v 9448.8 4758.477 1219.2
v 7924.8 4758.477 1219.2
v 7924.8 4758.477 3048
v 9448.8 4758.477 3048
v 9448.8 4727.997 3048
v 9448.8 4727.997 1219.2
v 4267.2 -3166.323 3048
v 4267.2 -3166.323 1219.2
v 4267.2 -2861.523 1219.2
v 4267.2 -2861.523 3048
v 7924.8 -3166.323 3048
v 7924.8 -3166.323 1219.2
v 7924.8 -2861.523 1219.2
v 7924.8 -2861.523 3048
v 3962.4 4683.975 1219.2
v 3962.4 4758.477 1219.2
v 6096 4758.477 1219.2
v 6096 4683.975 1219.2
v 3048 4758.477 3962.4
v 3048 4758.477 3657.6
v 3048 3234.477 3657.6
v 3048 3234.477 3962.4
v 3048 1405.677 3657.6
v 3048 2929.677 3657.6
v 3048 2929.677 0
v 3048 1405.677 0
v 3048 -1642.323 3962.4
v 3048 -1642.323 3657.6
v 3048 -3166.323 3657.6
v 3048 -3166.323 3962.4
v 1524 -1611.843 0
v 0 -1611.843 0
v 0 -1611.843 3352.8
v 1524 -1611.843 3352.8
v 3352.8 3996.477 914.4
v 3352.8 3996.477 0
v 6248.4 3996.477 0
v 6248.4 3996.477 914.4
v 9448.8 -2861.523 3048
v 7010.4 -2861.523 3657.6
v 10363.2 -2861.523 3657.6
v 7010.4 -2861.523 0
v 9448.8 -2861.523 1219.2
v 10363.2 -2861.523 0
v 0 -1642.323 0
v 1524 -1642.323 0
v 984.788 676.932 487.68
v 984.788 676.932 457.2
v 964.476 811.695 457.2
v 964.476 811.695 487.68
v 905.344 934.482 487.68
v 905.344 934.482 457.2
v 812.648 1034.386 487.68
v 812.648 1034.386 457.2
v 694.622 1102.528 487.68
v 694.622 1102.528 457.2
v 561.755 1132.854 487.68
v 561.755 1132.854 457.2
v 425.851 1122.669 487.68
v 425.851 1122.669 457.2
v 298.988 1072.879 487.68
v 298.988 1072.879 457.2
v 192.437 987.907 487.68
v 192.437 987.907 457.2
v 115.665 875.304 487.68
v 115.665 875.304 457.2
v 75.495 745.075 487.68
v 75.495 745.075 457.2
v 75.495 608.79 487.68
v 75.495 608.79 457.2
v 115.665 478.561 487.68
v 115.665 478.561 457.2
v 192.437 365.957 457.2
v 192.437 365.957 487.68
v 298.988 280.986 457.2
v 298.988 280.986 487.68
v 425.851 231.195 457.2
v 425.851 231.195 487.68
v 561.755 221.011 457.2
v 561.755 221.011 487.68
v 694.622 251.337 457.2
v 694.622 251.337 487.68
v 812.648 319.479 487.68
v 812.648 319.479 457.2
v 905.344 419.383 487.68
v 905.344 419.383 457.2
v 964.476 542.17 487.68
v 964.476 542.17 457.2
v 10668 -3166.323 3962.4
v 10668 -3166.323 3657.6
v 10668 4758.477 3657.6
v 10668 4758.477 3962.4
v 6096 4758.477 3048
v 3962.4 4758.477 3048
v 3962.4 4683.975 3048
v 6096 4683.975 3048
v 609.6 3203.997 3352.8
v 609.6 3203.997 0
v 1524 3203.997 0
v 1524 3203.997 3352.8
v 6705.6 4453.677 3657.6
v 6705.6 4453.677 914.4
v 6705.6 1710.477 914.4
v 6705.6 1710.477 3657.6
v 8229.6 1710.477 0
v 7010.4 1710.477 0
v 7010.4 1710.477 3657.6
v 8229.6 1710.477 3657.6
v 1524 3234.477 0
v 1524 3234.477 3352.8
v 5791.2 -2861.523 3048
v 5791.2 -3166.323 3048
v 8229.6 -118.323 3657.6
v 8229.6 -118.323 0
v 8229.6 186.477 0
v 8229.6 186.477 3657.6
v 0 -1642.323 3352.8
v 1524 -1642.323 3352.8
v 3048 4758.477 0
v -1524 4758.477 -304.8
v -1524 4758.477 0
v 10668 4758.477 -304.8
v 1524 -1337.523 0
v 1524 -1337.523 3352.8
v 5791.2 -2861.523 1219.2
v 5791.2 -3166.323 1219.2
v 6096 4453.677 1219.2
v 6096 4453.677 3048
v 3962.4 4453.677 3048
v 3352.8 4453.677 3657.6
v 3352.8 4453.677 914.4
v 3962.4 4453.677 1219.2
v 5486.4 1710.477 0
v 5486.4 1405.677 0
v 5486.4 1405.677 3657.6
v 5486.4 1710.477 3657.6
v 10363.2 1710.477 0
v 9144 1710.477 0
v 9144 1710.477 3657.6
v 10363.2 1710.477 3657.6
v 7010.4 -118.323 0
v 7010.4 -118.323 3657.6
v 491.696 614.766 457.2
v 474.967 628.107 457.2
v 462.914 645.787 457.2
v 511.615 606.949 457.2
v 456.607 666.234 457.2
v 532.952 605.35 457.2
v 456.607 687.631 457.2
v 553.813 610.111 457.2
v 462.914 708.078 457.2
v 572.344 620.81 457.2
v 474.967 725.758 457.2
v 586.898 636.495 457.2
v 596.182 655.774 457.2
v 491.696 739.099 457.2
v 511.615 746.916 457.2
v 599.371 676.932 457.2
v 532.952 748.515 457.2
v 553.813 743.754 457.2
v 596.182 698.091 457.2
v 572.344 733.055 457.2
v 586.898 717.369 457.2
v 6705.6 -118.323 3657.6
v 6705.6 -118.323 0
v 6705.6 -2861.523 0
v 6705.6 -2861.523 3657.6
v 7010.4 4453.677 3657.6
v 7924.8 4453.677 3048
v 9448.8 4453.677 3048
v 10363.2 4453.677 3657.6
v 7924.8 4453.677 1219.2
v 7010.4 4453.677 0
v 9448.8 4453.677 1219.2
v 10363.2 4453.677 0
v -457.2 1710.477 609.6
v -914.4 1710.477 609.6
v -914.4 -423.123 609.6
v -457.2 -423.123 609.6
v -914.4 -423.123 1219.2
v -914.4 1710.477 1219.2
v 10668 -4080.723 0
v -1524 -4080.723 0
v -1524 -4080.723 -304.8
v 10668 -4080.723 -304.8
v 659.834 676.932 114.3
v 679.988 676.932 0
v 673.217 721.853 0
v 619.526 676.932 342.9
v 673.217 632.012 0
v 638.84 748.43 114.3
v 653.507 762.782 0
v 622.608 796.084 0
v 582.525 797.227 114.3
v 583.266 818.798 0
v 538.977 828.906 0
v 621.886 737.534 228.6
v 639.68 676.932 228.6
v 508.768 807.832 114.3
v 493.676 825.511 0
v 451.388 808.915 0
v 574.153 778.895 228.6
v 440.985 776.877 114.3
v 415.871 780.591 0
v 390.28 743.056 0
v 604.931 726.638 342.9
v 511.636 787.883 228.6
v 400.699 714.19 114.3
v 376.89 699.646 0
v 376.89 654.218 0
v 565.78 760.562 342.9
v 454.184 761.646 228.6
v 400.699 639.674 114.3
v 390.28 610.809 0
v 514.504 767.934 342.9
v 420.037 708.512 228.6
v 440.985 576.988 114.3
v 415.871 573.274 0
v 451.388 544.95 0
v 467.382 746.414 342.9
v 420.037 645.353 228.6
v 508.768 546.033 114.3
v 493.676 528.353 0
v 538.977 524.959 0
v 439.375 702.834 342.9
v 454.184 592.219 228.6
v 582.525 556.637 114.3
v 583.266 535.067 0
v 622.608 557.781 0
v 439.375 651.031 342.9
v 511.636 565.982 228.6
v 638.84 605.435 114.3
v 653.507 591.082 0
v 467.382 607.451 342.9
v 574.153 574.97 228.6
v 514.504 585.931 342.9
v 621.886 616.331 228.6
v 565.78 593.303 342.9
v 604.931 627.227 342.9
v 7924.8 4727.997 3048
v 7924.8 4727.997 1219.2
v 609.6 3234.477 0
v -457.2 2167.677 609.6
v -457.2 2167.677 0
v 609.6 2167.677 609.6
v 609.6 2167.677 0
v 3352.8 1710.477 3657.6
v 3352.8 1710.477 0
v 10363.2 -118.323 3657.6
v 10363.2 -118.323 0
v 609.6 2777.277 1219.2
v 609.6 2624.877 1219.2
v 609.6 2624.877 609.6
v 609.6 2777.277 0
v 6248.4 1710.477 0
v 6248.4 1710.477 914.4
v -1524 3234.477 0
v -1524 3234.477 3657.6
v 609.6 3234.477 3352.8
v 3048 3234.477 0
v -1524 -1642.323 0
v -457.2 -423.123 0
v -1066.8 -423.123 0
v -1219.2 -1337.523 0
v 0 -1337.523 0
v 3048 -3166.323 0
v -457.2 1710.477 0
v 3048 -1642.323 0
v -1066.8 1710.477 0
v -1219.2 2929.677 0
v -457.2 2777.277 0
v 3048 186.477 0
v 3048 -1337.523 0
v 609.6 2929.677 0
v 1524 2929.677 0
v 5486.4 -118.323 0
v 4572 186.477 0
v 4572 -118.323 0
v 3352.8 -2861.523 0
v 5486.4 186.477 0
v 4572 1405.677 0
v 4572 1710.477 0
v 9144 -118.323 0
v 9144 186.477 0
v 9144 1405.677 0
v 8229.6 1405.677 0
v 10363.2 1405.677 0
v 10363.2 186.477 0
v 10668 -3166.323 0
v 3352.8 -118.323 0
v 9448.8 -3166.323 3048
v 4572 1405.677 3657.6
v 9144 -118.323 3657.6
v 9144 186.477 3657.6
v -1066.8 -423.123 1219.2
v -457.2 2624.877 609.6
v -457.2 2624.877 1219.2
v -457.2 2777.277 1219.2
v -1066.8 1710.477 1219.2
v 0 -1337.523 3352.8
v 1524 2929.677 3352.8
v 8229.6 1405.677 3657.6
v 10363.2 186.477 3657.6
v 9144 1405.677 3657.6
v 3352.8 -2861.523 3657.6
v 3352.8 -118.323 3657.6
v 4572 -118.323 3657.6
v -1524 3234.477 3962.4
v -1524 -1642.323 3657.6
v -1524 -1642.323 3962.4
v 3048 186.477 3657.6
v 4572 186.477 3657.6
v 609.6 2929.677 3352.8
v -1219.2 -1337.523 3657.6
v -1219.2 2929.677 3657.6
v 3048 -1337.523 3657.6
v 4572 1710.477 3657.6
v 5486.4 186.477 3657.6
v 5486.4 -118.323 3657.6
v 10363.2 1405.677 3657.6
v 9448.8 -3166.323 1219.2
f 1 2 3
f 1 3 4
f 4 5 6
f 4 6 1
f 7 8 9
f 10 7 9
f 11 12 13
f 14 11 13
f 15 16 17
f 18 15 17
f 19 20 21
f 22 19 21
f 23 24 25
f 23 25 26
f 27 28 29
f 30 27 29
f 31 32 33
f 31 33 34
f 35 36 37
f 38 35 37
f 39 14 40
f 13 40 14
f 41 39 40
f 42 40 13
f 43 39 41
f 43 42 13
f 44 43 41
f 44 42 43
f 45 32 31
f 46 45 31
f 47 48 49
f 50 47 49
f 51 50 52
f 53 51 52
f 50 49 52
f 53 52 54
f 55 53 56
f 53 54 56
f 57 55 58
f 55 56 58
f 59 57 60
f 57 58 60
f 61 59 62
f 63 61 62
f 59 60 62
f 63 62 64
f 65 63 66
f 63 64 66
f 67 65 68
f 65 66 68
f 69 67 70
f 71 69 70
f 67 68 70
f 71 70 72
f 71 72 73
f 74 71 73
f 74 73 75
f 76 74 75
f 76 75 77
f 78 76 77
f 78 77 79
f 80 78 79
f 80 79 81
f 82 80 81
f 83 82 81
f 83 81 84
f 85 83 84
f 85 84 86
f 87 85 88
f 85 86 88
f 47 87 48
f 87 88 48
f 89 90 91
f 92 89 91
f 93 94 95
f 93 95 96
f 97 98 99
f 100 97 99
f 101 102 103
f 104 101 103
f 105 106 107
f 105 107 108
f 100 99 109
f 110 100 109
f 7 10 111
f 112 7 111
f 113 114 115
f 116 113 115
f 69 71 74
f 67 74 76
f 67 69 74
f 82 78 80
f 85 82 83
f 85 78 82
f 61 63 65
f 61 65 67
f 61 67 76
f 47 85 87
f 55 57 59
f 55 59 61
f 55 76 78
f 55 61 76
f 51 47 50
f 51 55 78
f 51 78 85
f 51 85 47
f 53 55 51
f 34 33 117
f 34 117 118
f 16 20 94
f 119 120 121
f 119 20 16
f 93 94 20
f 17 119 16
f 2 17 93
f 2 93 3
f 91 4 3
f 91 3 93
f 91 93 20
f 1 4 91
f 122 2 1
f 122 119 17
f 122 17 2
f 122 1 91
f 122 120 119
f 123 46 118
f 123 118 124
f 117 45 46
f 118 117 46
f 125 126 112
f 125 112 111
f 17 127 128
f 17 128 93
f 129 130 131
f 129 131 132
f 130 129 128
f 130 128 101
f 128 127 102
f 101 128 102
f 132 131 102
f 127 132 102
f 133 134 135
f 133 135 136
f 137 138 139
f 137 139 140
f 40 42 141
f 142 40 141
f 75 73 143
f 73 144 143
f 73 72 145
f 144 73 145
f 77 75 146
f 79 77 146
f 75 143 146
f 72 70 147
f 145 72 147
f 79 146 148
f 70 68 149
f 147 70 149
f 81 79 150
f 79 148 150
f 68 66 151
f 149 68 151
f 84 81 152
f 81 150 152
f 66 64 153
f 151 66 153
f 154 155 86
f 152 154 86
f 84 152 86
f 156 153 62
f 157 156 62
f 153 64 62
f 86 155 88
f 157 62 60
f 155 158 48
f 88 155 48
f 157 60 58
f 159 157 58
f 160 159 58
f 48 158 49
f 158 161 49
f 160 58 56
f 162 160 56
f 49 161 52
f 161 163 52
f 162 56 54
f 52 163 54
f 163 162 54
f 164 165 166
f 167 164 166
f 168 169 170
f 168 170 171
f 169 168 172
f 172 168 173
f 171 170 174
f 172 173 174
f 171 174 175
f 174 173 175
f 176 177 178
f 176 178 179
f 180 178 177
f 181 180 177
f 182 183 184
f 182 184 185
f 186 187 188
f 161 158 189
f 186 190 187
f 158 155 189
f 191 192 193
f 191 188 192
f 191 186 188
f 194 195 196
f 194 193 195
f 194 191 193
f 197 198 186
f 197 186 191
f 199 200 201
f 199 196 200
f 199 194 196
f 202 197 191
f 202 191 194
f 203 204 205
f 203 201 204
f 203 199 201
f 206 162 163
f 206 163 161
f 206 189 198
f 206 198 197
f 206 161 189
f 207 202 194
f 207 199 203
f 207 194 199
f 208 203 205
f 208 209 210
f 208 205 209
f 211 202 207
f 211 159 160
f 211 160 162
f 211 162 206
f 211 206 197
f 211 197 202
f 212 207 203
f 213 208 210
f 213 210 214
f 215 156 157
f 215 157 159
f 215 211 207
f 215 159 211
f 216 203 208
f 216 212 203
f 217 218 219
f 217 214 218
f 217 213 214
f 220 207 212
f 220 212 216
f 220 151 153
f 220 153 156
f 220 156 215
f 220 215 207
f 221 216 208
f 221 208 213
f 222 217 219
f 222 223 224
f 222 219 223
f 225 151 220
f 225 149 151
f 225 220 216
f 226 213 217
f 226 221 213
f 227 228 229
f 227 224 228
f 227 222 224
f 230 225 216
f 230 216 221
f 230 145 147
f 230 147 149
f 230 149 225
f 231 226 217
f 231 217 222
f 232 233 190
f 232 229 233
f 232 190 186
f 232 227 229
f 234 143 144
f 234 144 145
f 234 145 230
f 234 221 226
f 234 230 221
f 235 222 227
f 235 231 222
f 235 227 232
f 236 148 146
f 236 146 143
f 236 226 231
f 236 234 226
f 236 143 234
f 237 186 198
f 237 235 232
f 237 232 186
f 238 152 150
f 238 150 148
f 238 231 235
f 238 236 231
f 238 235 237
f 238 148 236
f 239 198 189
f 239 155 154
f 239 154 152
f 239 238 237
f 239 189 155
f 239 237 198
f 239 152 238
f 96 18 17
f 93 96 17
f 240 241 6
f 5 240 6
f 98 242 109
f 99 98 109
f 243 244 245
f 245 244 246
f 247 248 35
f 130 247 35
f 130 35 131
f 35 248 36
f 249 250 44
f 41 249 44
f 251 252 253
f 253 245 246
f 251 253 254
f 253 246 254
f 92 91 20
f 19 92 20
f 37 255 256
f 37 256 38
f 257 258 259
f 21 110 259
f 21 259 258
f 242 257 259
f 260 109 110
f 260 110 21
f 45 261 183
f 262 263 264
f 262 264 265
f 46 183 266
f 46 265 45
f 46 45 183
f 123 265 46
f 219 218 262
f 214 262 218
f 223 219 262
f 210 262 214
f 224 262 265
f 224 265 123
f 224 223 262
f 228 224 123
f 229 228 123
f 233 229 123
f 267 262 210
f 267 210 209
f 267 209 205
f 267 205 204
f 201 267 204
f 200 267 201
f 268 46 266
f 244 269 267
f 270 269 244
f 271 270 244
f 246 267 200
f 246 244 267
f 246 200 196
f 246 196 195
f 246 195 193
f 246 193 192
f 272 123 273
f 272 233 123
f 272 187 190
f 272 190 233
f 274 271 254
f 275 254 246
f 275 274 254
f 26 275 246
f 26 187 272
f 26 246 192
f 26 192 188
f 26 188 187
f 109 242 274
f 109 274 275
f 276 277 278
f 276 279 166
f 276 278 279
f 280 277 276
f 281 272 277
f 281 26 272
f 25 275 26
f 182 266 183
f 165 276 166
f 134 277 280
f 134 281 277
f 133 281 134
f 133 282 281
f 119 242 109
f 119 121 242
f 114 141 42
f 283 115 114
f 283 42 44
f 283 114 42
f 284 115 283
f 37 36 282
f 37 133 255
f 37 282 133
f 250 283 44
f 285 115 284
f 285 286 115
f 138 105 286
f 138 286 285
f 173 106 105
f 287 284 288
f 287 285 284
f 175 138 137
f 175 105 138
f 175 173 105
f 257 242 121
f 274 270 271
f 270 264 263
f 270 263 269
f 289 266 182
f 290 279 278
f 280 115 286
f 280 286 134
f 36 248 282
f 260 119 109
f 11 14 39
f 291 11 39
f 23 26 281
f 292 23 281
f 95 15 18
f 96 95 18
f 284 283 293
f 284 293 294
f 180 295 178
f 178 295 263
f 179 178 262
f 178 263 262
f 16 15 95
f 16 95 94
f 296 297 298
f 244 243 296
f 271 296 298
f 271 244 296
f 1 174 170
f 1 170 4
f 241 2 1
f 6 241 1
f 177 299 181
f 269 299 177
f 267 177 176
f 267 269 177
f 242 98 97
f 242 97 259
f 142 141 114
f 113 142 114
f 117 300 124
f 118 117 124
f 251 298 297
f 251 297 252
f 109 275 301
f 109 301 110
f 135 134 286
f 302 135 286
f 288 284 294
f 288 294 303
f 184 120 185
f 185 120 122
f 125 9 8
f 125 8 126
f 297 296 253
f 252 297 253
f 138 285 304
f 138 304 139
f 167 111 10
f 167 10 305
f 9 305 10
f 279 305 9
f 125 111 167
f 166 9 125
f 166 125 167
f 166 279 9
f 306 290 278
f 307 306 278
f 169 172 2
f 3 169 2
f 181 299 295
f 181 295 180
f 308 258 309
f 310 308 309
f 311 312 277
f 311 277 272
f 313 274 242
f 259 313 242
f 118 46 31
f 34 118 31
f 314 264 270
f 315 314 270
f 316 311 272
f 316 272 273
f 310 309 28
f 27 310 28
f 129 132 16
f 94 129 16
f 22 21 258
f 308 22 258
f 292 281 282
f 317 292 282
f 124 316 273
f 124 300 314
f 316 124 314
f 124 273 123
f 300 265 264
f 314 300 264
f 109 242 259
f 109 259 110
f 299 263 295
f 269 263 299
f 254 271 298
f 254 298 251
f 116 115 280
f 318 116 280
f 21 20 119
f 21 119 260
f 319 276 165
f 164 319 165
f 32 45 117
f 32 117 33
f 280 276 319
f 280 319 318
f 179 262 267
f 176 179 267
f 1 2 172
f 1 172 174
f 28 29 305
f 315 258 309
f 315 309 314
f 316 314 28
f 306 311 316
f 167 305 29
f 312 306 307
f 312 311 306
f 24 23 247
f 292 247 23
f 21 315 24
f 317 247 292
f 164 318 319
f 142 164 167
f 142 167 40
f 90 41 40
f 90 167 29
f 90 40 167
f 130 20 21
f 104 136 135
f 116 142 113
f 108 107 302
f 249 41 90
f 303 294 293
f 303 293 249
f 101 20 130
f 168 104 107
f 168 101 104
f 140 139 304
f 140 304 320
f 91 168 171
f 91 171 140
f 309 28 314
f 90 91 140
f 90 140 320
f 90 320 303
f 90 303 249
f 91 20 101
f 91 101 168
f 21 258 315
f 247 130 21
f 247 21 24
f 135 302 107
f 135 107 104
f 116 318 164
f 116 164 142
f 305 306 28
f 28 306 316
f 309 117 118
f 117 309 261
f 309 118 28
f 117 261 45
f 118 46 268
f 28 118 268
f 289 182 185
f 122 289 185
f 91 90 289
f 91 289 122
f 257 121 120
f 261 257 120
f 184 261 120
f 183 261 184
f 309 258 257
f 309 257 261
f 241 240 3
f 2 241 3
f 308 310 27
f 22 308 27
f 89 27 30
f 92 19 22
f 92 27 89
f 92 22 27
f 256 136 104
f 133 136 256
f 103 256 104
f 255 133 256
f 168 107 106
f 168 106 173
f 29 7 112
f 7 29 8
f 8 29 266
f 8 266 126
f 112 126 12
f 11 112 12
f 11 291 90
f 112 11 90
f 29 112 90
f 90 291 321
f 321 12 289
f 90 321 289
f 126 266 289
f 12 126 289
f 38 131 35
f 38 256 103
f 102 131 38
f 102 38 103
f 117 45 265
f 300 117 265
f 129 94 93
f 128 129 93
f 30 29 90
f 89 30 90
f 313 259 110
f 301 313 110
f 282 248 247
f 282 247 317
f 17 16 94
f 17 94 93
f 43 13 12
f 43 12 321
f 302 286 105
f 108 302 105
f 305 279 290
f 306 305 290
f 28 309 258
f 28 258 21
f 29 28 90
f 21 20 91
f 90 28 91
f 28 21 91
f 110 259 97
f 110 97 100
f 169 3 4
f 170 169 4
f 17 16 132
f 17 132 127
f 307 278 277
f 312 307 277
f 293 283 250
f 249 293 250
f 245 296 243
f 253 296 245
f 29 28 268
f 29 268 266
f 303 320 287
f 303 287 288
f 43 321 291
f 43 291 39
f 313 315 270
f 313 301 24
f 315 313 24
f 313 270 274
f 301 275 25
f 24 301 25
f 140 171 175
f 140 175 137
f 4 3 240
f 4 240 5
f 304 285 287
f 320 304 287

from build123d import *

# Parameters (mm, degrees)
F0_W      = 1828.8
F0_H      = 304.8
F1_DEPTH  = 3657.6
F0_W_2    = 1524
F0_W_3    = 1219.2
F0_W_4    = 914.4
F0_W_5    = 609.6
F2_W      = 12192
F2_H      = 7924.8
F2_H_2    = 914.4
F3_DEPTH  = 304.8
F4_W      = 2133.6
F4_H      = 304.8
F4_W_2    = 1524
F5_DEPTH  = 1219.2
F7_W      = 2133.6
F7_H      = 304.8
F7_W_2    = 1524
F8_DEPTH  = 609.6
F11_DEPTH = 304.8
F13_W     = 1524
F13_H     = 30.48
F14_DEPTH = 3352.8
F13_W_2   = 914.4
F15_W     = 1524
F15_H     = 304.8
F16_DEPTH = 1219.2
F17_W     = 457.2
F17_H     = 2286
F18_DEPTH = 914.4
F19_W     = 1066.8
F19_H     = 609.6
F19_W_2   = 609.6
F19_H_2   = 2133.6
F20_DEPTH = 609.6
F21_W     = 1066.8
F21_H     = 152.4
F21_W_2   = 152.4
F21_H_2   = 2133.6
F22_DEPTH = 609.6
F23_R     = 152.4
F24_DEPTH = 457.2
F24_TAPER = 10
F25_R     = 457.2
F26_DEPTH = 30.48
F27_W     = 914.4
F27_H     = 304.8
F27_W_2   = 1524
F28_DEPTH = 304.8
F29_W     = 1524
F29_H     = 30.48
F30_DEPTH = 1828.8
F31_W     = 2133.6
F31_H     = 74.5021455099
F32_DEPTH = 1828.8


with BuildPart() as f1:
    # F0 (on Top) → F1 (new body)
    with BuildSketch(Plane.XY):
        Polygon((-1524, -1337.5231116007), (-1524, -1642.3231116007), (0, -1642.3231116007), (0, -1337.5231116007), (-1219.2, -1337.5231116007), align=None)
        Polygon((-1524, 3234.4768883993), (-1524, -1337.5231116007), (-1219.2, -1337.5231116007), (-1219.2, 2929.6768883993), (-1219.2, 3234.4768883993), align=None)
        with Locations((-304.8, 3082.0768883993)):
            Rectangle(F0_W, F0_H)
    extrude(amount=F1_DEPTH)



with BuildPart() as f1b:
    # F0 (on Top) → F1, piece 2 (new body)
    with BuildSketch(Plane.XY):
        with Locations((2286, -1489.9231116007)):
            Rectangle(F0_W_2, F0_H)
        Polygon((3048, 186.4768883993), (3048, -1337.5231116007), (3048, -1642.3231116007), (3048, -3166.3231116007), (3352.8, -3166.3231116007), (3352.8, -2861.5231116007), (3352.8, -118.3231116007), (3352.8, 186.4768883993), align=None)
        with Locations((3962.4, 34.0768883993)):
            Rectangle(F0_W_3, F0_H)
        with Locations((3810, -3013.9231116007)):
            Rectangle(F0_W_4, F0_H)
    extrude(amount=F1_DEPTH)


with BuildPart() as f1c:
    # F0 (on Top) → F1, piece 3 (new body)
    with BuildSketch(Plane.XY):
        with Locations((2286, 3082.0768883993)):
            Rectangle(F0_W_2, F0_H)
        Polygon((3048, 4758.4768883993), (3048, 3234.4768883993), (3048, 2929.6768883993), (3048, 1405.6768883993), (3352.8, 1405.6768883993), (3352.8, 1710.4768883993), (3352.8, 4453.6768883993), (3352.8, 4758.4768883993), align=None)
        with Locations((3657.6, 4606.0768883993)):
            Rectangle(F0_W_5, F0_H)
        with Locations((3962.4, 1558.0768883993)):
            Rectangle(F0_W_3, F0_H)
    extrude(amount=F1_DEPTH)


with BuildPart() as f1d:
    # F0 (on Top) → F1, piece 4 (new body)
    with BuildSketch(Plane.XY):
        with Locations((6096, 1558.0768883993)):
            Rectangle(F0_W_3, F0_H)
        Polygon((6705.6, 4453.6768883993), (6705.6, 1710.4768883993), (6705.6, 1405.6768883993), (7010.4, 1405.6768883993), (7010.4, 1710.4768883993), (7010.4, 4453.6768883993), (7010.4, 4758.4768883993), (6705.6, 4758.4768883993), align=None)
        with Locations((6400.8, 4606.0768883993)):
            Rectangle(F0_W_5, F0_H)
        with Locations((7620, 1558.0768883993)):
            Rectangle(F0_W_3, F0_H)
        with Locations((7467.6, 4606.0768883993)):
            Rectangle(F0_W_4, F0_H)
    extrude(amount=F1_DEPTH)


with BuildPart() as f1e:
    # F0 (on Top) → F1, piece 5 (new body)
    with BuildSketch(Plane.XY):
        with Locations((6096, 34.0768883993)):
            Rectangle(F0_W_3, F0_H)
        Polygon((7010.4, 186.4768883993), (6705.6, 186.4768883993), (6705.6, -118.3231116007), (6705.6, -2861.5231116007), (6705.6, -3166.3231116007), (7010.4, -3166.3231116007), (7010.4, -2861.5231116007), (7010.4, -118.3231116007), align=None)
        with Locations((7620, 34.0768883993)):
            Rectangle(F0_W_3, F0_H)
        with Locations((6248.4, -3013.9231116007)):
            Rectangle(F0_W_4, F0_H)
        with Locations((7467.6, -3013.9231116007)):
            Rectangle(F0_W_4, F0_H)
    extrude(amount=F1_DEPTH)


with BuildPart() as f1f:
    # F0 (on Top) → F1, piece 6 (new body)
    with BuildSketch(Plane.XY):
        with Locations((9906, 4606.0768883993)):
            Rectangle(F0_W_4, F0_H)
        Polygon((10668, 4758.4768883993), (10363.2, 4758.4768883993), (10363.2, 4453.6768883993), (10363.2, 1710.4768883993), (10363.2, 1405.6768883993), (10668, 1405.6768883993), align=None)
        with Locations((9753.6, 1558.0768883993)):
            Rectangle(F0_W_3, F0_H)
        Polygon((10668, -3166.3231116007), (10668, 1405.6768883993), (10363.2, 1405.6768883993), (10363.2, 186.4768883993), (10363.2, -118.3231116007), (10363.2, -2861.5231116007), (10363.2, -3166.3231116007), align=None)
        with Locations((9753.6, 34.0768883993)):
            Rectangle(F0_W_3, F0_H)
        with Locations((9906, -3013.9231116007)):
            Rectangle(F0_W_4, F0_H)
    extrude(amount=F1_DEPTH)


with BuildPart() as f1_1:
    add(f1.part)

    add(f1b.part)  # F3 merges F1b

    add(f1c.part)  # F3 merges F1c

    add(f1d.part)  # F3 merges F1d

    add(f1e.part)  # F3 merges F1e

    add(f1f.part)  # F3 merges F1f
    # F2 (on Top) → F3 (join)
    with BuildSketch(Plane.XY):
        with Locations((4572, 796.0768883993)):
            Rectangle(F2_W, F2_H)
        with Locations((4572, -3623.5231116007)):
            Rectangle(F2_W, F2_H_2)
    extrude(amount=-F3_DEPTH)

    # F4 (on Top) → F5 (join)
    with BuildSketch(Plane.XY):
        with Locations((5029.2, 4606.0768883993)):
            Rectangle(F4_W, F4_H)
        with Locations((8686.8, -3013.9231116007)):
            Rectangle(F4_W_2, F4_H)
        with Locations((5029.2, -3013.9231116007)):
            Rectangle(F4_W_2, F4_H)
    extrude(amount=F5_DEPTH)

    # F7 (on offset) → F8 (join)
    with BuildSketch(Plane.XY.offset(3048)):
        with Locations((5029.2, 4606.0768883993)):
            Rectangle(F7_W, F7_H)
        with Locations((8686.8, 4606.0768883993)):
            Rectangle(F7_W_2, F7_H)
        with Locations((8686.8, -3013.9231116007)):
            Rectangle(F7_W_2, F7_H)
        with Locations((5029.2, -3013.9231116007)):
            Rectangle(F7_W_2, F7_H)
    extrude(amount=F8_DEPTH)

    # F12: union 

    # F15 (on Top) → F16 (join)
    with BuildSketch(Plane.XY):
        with Locations((8686.8, 4606.0768883993)):
            Rectangle(F15_W, F15_H)
    extrude(amount=F16_DEPTH)

    # F17 (on Top) → F18 (join)
    with BuildSketch(Plane.XY):
        Polygon((6705.6, 4453.6768883993), (3352.8, 4453.6768883993), (3352.8, 3996.4768883993), (6248.4, 3996.4768883993), (6705.6, 3996.4768883993), align=None)
        with Locations((6477, 2853.4768883993)):
            Rectangle(F17_W, F17_H)
    extrude(amount=F18_DEPTH)

    # F19 (on Top) → F20 (join)
    with BuildSketch(Plane.XY):
        with Locations((76.2, 2472.4768883993)):
            Rectangle(F19_W, F19_H)
        with Locations((-762, 643.6768883993)):
            Rectangle(F19_W_2, F19_H_2)
    extrude(amount=F20_DEPTH)

    # F21 (on face) → F22 (join)
    with BuildSketch(Plane.XY.offset(609.6)):
        with Locations((76.2, 2701.0768883993)):
            Rectangle(F21_W, F21_H)
        with Locations((-990.6, 643.6768883993)):
            Rectangle(F21_W_2, F21_H_2)
    extrude(amount=F22_DEPTH)

    # F23 (on Top) → F24 (join)
    with BuildSketch(Plane.XY):
        with Locations((527.5880694389, 676.9324541092)):
            Circle(F23_R)
    extrude(amount=F24_DEPTH, taper=F24_TAPER)

    # F25 (on face) → F26 (join)
    with BuildSketch(Plane.XY.offset(457.2)):
        with Locations((527.5880694389, 676.9324541092)):
            Circle(F25_R)
    extrude(amount=F26_DEPTH)

    # F27 (on face) → F28 (join)
    with BuildSketch(Plane.XY.offset(3352.8)):
        with Locations((1066.8, 3082.0768883993)):
            Rectangle(F27_W, F27_H)
        with Locations((762, -1489.9231116007)):
            Rectangle(F27_W_2, F27_H)
    extrude(amount=F28_DEPTH)


with BuildPart() as f11:
    # F10 (on offset) → F11 (new body)
    with BuildSketch(Plane.XY.offset(3657.6)):
        Polygon((3048, 3234.4768883993), (-1524, 3234.4768883993), (-1524, -1642.3231116007), (3048, -1642.3231116007), (3048, -3166.3231116007), (10668, -3166.3231116007), (10668, 4758.4768883993), (3048, 4758.4768883993), align=None)
    extrude(amount=F11_DEPTH)


with BuildPart() as f14:
    # F13 (on Top) → F14 (new body)
    with BuildSketch(Plane.XY):
        with Locations((762, -1627.0831116007)):
            Rectangle(F13_W, F13_H)
    extrude(amount=F14_DEPTH)


with BuildPart() as f14b:
    # F13 (on Top) → F14, piece 2 (new body)
    with BuildSketch(Plane.XY):
        with Locations((1066.8, 3219.2368883993)):
            Rectangle(F13_W_2, F13_H)
    extrude(amount=F14_DEPTH)


with BuildPart() as f30:
    # F29 (on face) → F30 (new body)
    with BuildSketch(Plane.XY.offset(1219.2)):
        with Locations((8686.8, 4743.2368883993)):
            Rectangle(F29_W, F29_H)
    extrude(amount=F30_DEPTH)


with BuildPart() as f32:
    # F31 (on face) → F32 (new body)
    with BuildSketch(Plane.XY.offset(1219.2)):
        with Locations((5029.2, 4721.2258156443)):
            Rectangle(F31_W, F31_H)
    extrude(amount=F32_DEPTH)


solid = Compound([f1_1.part, f11.part, f14.part, f14b.part, f30.part, f32.part])
